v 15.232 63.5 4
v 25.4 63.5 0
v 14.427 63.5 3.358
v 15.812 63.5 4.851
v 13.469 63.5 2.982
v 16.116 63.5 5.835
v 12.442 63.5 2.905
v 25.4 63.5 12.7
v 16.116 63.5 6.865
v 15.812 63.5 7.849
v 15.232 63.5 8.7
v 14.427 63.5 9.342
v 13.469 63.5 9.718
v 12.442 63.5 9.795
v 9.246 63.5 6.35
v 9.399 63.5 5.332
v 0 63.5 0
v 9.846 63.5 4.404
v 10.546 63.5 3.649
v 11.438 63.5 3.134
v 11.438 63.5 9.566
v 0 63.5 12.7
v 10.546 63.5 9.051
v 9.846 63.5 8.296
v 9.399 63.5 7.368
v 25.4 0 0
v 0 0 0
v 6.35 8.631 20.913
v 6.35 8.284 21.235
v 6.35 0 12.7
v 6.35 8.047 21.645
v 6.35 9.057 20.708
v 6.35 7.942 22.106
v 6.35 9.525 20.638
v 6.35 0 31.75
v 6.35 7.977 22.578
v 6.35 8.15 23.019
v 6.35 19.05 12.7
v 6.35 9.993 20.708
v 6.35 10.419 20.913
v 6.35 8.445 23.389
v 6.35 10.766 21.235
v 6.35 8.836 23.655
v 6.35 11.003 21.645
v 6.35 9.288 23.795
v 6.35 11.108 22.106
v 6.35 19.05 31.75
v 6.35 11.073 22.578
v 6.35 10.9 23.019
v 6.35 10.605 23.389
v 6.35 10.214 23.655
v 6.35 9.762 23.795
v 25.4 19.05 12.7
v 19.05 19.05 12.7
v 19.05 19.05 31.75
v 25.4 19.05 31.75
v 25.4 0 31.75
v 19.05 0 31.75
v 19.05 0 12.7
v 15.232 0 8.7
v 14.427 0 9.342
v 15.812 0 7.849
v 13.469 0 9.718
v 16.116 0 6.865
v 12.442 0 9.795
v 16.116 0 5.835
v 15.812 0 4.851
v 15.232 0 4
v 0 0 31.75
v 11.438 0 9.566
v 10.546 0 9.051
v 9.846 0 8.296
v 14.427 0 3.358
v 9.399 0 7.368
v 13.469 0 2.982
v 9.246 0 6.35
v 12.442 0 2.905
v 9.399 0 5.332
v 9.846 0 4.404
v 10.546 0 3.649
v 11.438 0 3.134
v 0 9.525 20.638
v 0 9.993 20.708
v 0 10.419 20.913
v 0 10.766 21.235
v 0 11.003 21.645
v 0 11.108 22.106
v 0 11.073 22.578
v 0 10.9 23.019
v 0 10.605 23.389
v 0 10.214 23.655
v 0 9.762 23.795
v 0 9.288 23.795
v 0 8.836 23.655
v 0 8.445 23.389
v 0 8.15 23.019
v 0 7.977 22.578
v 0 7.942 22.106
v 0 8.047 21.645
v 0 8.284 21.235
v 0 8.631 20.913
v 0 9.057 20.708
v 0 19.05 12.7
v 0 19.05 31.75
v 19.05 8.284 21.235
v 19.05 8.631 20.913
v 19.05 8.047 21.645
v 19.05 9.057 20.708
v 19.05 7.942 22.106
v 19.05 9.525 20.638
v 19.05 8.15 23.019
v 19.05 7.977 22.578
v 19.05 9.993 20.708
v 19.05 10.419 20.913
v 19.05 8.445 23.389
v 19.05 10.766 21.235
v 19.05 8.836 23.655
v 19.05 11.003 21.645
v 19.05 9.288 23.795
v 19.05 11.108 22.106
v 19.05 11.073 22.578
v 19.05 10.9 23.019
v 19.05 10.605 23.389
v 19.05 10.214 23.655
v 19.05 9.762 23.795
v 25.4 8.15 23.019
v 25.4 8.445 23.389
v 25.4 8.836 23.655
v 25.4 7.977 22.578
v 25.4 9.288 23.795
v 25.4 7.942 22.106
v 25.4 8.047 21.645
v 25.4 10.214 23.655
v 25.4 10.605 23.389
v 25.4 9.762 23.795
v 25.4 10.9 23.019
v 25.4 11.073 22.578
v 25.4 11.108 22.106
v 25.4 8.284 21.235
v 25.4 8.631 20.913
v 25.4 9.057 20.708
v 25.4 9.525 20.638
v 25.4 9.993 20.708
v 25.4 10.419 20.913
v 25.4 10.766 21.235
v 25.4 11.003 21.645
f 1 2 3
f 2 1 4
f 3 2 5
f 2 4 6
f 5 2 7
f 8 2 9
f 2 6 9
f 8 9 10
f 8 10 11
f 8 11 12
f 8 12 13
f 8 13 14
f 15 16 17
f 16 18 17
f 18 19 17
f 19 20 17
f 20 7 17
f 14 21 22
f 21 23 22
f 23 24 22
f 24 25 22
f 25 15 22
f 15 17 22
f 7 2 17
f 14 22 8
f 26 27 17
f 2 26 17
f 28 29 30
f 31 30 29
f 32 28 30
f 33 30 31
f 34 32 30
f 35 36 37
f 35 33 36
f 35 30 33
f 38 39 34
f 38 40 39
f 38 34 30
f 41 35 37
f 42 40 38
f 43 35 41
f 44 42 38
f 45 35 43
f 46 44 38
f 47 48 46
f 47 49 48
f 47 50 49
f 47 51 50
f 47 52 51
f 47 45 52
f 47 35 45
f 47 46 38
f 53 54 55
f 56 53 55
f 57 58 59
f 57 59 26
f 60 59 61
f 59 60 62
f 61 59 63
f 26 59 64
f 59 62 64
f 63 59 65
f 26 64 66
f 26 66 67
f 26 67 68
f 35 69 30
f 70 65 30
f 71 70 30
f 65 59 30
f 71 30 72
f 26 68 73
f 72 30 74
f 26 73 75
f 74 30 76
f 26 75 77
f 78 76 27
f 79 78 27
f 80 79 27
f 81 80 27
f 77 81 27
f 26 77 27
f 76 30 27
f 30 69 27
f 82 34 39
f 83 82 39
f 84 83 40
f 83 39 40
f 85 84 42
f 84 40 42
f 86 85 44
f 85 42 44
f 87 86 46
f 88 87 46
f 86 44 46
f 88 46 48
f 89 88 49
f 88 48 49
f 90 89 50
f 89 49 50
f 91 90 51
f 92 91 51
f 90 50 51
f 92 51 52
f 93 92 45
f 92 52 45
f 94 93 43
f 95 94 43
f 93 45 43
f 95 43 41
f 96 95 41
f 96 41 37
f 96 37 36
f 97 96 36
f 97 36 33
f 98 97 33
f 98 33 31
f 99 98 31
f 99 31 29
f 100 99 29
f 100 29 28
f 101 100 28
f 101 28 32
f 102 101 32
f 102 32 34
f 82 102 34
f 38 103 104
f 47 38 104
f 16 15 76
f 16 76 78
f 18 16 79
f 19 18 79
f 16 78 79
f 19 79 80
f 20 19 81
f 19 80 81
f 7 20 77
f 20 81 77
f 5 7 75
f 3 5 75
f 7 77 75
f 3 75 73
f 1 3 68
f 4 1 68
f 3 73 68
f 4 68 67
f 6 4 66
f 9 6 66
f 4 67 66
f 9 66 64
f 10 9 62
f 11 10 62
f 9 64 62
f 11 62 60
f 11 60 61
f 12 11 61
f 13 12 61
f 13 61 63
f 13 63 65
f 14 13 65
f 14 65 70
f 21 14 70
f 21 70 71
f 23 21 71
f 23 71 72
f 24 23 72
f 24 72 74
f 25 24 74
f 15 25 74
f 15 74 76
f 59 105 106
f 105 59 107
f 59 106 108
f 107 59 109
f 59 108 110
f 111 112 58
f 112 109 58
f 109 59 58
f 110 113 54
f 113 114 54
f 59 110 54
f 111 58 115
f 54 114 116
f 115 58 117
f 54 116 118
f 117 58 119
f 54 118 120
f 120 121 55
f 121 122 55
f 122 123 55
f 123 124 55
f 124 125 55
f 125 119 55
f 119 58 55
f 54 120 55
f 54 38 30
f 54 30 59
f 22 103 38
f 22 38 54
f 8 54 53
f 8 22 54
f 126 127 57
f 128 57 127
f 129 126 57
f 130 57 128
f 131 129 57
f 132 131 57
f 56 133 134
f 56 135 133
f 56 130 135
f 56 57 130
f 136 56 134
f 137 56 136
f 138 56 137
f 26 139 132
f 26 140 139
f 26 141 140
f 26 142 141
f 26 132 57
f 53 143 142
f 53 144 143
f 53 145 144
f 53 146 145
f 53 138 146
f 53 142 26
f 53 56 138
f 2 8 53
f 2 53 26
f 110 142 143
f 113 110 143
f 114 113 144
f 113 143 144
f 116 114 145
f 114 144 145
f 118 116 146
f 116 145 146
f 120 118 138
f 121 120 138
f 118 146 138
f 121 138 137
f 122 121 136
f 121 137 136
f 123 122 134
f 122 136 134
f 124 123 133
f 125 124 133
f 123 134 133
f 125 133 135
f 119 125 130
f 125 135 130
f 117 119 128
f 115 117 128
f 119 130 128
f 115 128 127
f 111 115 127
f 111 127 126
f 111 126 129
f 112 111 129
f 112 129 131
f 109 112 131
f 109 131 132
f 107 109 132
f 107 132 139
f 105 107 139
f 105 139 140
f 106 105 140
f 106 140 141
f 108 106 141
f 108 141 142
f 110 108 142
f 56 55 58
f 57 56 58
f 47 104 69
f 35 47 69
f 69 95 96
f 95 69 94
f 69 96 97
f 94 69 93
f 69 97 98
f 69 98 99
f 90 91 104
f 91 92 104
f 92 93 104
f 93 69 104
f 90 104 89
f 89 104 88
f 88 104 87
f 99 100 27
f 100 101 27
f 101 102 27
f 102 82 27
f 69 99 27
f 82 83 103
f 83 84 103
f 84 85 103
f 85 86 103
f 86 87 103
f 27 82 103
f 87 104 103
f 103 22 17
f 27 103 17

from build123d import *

# Parameters (mm, degrees)
BOSS_EXTRUDE1_DEPTH      = 25.4
SKETCH2_R                = 1.5875
CUT_EXTRUDE1_DEPTH       = 26.4
SKETCH3_W                = 12.7
SKETCH3_H                = 19.05
CUT_EXTRUDE2_DEPTH       = 19.05
F_5_16_24_TAPPED_HOLE1_D = 6.9088


with BuildPart() as part:
    # Sketch1 → Boss-Extrude1 (new body)
    with BuildSketch(Plane(origin=(0, 0, 0), x_dir=(0, 0, -1), z_dir=(1, 0, 0))):
        Polygon((0, 0), (0, 63.5), (-12.7, 63.5), (-12.7, 19.05), (-31.75, 19.05), (-31.75, 0), align=None)
    extrude(amount=BOSS_EXTRUDE1_DEPTH)

    # Sketch2 → Cut-Extrude1 (cut, through all)
    with BuildSketch(Plane(origin=(25.4, 0, 0), x_dir=(0, 0, -1), z_dir=(1, 0, 0))):
        with Locations((-22.225, 9.525)):
            Circle(SKETCH2_R)
    extrude(amount=-CUT_EXTRUDE1_DEPTH, mode=Mode.SUBTRACT)

    # Sketch3 → Cut-Extrude2 (cut)
    with BuildSketch(Plane.XY.offset(31.75)):
        with Locations((12.7, 9.525)):
            Rectangle(SKETCH3_W, SKETCH3_H)
    extrude(amount=-CUT_EXTRUDE2_DEPTH, mode=Mode.SUBTRACT)

    # 5/16-24 Tapped Hole1 (through all)
    with Locations(Plane(origin=(0, 63.5, 0), x_dir=(1, 0, 0), z_dir=(0, 1, 0))):
        with Locations((12.7, -6.35)):
            Hole(F_5_16_24_TAPPED_HOLE1_D / 2)


solid = part.part
